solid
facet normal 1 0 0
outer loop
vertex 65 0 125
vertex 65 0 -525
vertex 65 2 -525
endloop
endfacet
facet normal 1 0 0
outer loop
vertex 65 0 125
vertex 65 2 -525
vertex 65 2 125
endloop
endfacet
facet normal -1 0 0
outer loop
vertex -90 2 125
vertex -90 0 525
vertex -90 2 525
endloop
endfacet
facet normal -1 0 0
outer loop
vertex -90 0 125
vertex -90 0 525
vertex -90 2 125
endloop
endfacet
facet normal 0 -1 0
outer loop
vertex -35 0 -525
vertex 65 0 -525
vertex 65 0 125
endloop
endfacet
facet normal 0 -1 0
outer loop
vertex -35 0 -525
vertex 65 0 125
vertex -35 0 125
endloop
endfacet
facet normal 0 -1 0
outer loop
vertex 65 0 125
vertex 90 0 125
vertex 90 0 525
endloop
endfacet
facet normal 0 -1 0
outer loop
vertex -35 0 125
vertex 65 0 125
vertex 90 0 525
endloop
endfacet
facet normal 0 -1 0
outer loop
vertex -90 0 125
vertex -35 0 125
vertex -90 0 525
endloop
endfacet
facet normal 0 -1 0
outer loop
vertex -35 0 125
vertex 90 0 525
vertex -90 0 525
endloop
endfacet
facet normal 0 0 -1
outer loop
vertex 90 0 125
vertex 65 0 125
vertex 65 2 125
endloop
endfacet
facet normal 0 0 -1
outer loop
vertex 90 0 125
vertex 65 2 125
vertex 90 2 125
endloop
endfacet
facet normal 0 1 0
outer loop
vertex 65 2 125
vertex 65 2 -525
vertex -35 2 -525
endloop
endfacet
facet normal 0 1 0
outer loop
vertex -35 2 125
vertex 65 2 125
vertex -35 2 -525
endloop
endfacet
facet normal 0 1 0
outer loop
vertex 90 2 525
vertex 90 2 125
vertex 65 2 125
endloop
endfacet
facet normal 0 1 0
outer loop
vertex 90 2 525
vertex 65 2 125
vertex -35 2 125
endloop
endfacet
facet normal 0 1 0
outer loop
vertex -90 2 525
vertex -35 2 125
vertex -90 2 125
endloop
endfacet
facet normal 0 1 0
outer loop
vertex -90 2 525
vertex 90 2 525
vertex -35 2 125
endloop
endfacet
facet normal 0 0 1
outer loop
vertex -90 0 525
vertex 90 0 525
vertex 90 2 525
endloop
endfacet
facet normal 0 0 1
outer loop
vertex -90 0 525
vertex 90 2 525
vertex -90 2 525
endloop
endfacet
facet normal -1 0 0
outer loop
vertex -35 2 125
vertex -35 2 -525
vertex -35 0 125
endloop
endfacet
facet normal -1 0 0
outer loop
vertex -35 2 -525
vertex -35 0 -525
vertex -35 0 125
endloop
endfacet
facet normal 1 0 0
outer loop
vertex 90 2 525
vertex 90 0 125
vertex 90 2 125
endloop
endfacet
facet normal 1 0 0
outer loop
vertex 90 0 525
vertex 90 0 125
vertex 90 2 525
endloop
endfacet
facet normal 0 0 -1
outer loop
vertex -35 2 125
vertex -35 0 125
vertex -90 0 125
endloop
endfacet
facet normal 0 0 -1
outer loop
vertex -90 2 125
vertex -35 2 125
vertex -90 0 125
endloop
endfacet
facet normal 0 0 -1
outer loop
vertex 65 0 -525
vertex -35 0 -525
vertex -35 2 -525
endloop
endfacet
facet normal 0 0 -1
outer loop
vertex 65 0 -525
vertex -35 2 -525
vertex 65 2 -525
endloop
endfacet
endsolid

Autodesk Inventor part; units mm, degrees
ref_plane "YZ Plane" through (0, 0, 0) normal (1, 0, 0) x (0, 1, 0)
ref_plane "XZ Plane" through (0, 0, 0) normal (0, 1, 0) x (-1, 0, 0)
ref_plane "XY Plane" through (0, 0, 0) normal (0, 0, 1) x (1, 0, 0)
sketch "Sketch1" plane through (0, 0, 0) normal (0, 1, 0) x (-1, 0, 0)
  line L0 (35, -525) -> (-65, -525)
  line L1 (-90, 125) -> (-90, 525)
  line L2 (-90, 525) -> (90, 525)
  line L3 (-65, -525) -> (-65, 125)
  line L4 (-65, 125) -> (-90, 125)
  line L5 (0, 525) -> (0, -525)
  line L6 (35, -525) -> (35, 125)
  line L7 (35, 125) -> (90, 125)
  line L8 (90, 525) -> (90, 125)
  line L9 (35, 0) -> (-65, 0)
  point P0 (0, 0)
  dimension "d2" = 650
  dimension "d6" = 1050
  dimension "d7" = 180
  dimension "d8" = 55
  dimension "d9" = 155
extrude "Extrusion1" add sketch "Sketch1" along normal blind 2
properties part number "La" material "LCP Plastic"
